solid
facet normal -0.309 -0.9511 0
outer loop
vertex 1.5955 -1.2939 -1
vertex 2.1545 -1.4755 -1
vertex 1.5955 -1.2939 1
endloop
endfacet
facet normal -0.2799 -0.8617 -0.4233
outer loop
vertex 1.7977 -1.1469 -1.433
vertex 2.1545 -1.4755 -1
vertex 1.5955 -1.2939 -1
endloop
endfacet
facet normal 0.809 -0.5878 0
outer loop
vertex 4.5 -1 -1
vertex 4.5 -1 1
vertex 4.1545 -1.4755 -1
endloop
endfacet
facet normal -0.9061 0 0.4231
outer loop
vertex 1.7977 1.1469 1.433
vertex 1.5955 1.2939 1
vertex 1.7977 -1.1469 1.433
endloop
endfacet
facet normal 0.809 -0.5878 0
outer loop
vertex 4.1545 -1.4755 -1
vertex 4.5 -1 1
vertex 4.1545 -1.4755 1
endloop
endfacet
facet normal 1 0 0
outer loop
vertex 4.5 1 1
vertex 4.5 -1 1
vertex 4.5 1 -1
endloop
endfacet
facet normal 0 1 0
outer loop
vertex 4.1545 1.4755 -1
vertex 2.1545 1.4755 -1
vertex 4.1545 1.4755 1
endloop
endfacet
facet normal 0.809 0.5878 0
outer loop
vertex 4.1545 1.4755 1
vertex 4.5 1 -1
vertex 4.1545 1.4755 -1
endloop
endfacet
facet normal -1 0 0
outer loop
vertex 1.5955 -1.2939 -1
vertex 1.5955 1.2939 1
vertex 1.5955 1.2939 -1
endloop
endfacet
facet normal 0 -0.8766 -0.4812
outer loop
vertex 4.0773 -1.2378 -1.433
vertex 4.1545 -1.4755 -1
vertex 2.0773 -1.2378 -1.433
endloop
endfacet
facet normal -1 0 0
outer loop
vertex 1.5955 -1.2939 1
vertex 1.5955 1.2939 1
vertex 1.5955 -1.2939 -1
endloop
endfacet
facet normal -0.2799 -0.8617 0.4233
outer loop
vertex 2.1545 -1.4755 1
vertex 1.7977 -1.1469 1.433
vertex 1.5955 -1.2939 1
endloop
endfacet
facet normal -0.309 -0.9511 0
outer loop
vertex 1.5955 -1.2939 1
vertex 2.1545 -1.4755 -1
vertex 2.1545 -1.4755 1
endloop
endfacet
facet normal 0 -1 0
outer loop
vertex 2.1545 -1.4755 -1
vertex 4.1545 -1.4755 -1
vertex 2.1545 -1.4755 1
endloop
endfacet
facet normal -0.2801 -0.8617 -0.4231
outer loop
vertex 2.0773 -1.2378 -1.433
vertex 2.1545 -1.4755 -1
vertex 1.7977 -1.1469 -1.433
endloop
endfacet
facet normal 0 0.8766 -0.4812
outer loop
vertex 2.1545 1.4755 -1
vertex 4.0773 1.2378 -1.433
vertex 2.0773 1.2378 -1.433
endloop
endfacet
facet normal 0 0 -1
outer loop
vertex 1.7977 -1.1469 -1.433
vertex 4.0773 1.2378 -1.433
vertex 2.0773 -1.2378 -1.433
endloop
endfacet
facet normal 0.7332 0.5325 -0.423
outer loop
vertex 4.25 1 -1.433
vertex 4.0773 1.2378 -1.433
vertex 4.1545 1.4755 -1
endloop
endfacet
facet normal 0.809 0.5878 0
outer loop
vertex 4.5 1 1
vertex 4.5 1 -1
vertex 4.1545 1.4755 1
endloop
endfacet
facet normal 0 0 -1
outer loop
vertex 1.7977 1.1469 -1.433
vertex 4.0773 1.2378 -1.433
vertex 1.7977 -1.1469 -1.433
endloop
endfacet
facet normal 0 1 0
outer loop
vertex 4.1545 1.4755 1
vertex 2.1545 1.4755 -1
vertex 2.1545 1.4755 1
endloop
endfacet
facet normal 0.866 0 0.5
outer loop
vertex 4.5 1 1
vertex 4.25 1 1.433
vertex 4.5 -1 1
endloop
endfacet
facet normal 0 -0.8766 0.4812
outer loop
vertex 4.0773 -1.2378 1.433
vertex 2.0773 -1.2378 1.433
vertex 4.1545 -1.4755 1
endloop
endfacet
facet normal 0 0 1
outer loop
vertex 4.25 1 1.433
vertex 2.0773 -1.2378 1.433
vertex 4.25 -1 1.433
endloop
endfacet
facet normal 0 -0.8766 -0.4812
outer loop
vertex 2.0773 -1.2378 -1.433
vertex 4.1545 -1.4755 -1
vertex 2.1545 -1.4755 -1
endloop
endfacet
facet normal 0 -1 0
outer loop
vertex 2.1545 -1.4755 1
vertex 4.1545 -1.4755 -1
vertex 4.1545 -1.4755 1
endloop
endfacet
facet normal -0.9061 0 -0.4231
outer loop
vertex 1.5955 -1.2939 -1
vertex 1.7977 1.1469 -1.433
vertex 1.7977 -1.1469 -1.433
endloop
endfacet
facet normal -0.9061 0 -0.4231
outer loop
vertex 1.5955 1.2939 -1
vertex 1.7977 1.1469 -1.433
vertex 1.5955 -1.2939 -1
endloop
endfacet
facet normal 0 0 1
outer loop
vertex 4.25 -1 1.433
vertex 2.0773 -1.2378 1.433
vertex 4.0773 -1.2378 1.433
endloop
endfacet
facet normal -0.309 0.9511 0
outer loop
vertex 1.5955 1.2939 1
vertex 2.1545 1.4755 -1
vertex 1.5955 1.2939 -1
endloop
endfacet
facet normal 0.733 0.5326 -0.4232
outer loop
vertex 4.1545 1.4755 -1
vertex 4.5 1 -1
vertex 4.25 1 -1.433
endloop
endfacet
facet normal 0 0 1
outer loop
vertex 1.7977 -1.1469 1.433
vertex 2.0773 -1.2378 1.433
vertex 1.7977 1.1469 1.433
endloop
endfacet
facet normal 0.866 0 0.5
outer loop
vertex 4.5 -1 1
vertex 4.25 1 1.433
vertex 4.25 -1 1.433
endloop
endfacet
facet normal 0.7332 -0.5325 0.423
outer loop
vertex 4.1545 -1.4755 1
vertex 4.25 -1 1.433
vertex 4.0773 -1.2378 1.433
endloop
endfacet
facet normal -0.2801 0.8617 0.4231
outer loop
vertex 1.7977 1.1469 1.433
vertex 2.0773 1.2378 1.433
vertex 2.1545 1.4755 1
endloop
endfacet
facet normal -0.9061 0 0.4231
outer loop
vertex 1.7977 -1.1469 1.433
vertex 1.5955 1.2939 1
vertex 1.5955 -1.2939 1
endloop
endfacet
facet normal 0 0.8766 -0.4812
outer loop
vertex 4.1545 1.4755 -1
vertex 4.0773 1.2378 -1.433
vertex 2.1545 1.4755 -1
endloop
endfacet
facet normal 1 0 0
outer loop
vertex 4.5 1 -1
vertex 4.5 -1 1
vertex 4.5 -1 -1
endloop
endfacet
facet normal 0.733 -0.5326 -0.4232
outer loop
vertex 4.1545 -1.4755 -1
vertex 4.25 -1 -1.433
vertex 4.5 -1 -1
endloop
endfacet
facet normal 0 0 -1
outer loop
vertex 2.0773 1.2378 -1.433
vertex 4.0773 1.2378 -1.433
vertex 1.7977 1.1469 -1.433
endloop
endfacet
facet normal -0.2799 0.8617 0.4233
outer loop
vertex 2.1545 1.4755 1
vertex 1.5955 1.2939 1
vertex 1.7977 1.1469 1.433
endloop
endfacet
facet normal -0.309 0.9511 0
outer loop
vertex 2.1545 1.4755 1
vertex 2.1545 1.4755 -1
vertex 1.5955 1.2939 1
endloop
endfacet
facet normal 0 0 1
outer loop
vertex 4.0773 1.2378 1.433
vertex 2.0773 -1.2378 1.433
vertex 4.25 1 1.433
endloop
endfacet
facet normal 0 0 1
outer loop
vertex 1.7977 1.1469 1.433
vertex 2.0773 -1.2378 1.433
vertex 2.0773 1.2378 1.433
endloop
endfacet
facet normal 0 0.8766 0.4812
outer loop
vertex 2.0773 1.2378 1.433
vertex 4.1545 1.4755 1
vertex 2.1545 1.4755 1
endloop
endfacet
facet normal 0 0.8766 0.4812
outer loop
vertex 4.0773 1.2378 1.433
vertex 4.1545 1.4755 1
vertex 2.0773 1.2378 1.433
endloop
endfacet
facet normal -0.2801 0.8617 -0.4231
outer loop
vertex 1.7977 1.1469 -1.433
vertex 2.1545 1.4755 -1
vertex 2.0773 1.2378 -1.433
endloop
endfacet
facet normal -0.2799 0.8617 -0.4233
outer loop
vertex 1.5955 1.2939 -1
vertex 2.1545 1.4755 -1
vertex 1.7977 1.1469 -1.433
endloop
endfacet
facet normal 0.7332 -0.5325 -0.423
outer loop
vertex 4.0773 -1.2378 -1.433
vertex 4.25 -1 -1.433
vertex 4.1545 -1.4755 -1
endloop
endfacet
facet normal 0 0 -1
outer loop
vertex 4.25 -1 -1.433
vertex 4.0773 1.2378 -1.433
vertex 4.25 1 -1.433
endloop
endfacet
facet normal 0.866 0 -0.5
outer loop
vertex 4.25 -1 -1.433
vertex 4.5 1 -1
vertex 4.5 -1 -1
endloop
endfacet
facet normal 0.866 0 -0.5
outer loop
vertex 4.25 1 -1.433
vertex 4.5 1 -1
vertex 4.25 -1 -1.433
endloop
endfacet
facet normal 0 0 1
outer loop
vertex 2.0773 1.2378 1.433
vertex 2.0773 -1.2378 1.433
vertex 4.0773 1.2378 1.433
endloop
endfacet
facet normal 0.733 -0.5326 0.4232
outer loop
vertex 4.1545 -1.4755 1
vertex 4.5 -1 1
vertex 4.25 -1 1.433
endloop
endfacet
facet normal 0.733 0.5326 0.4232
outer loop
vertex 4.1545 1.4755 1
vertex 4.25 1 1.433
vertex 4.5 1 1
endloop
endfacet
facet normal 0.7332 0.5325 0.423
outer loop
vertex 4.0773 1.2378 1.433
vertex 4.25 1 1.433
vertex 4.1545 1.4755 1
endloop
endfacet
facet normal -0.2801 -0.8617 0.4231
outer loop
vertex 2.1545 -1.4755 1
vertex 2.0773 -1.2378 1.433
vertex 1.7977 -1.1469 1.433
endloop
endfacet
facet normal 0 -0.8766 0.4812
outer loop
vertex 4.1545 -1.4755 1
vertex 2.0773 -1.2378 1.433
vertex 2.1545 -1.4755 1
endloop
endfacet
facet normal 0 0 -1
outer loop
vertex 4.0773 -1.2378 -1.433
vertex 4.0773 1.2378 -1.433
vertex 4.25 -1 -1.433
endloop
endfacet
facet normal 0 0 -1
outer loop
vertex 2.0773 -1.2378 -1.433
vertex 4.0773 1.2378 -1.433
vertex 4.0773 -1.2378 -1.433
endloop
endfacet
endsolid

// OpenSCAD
// Refused: `A + (ball + t)` is the offset translated by `t`, and only the
// radius follows the shape, so a ball off the origin cannot be placed.
minkowski() {
  cube([2, 2, 2], center = true);
  translate([3, 0, 0]) sphere(0.5);
}
